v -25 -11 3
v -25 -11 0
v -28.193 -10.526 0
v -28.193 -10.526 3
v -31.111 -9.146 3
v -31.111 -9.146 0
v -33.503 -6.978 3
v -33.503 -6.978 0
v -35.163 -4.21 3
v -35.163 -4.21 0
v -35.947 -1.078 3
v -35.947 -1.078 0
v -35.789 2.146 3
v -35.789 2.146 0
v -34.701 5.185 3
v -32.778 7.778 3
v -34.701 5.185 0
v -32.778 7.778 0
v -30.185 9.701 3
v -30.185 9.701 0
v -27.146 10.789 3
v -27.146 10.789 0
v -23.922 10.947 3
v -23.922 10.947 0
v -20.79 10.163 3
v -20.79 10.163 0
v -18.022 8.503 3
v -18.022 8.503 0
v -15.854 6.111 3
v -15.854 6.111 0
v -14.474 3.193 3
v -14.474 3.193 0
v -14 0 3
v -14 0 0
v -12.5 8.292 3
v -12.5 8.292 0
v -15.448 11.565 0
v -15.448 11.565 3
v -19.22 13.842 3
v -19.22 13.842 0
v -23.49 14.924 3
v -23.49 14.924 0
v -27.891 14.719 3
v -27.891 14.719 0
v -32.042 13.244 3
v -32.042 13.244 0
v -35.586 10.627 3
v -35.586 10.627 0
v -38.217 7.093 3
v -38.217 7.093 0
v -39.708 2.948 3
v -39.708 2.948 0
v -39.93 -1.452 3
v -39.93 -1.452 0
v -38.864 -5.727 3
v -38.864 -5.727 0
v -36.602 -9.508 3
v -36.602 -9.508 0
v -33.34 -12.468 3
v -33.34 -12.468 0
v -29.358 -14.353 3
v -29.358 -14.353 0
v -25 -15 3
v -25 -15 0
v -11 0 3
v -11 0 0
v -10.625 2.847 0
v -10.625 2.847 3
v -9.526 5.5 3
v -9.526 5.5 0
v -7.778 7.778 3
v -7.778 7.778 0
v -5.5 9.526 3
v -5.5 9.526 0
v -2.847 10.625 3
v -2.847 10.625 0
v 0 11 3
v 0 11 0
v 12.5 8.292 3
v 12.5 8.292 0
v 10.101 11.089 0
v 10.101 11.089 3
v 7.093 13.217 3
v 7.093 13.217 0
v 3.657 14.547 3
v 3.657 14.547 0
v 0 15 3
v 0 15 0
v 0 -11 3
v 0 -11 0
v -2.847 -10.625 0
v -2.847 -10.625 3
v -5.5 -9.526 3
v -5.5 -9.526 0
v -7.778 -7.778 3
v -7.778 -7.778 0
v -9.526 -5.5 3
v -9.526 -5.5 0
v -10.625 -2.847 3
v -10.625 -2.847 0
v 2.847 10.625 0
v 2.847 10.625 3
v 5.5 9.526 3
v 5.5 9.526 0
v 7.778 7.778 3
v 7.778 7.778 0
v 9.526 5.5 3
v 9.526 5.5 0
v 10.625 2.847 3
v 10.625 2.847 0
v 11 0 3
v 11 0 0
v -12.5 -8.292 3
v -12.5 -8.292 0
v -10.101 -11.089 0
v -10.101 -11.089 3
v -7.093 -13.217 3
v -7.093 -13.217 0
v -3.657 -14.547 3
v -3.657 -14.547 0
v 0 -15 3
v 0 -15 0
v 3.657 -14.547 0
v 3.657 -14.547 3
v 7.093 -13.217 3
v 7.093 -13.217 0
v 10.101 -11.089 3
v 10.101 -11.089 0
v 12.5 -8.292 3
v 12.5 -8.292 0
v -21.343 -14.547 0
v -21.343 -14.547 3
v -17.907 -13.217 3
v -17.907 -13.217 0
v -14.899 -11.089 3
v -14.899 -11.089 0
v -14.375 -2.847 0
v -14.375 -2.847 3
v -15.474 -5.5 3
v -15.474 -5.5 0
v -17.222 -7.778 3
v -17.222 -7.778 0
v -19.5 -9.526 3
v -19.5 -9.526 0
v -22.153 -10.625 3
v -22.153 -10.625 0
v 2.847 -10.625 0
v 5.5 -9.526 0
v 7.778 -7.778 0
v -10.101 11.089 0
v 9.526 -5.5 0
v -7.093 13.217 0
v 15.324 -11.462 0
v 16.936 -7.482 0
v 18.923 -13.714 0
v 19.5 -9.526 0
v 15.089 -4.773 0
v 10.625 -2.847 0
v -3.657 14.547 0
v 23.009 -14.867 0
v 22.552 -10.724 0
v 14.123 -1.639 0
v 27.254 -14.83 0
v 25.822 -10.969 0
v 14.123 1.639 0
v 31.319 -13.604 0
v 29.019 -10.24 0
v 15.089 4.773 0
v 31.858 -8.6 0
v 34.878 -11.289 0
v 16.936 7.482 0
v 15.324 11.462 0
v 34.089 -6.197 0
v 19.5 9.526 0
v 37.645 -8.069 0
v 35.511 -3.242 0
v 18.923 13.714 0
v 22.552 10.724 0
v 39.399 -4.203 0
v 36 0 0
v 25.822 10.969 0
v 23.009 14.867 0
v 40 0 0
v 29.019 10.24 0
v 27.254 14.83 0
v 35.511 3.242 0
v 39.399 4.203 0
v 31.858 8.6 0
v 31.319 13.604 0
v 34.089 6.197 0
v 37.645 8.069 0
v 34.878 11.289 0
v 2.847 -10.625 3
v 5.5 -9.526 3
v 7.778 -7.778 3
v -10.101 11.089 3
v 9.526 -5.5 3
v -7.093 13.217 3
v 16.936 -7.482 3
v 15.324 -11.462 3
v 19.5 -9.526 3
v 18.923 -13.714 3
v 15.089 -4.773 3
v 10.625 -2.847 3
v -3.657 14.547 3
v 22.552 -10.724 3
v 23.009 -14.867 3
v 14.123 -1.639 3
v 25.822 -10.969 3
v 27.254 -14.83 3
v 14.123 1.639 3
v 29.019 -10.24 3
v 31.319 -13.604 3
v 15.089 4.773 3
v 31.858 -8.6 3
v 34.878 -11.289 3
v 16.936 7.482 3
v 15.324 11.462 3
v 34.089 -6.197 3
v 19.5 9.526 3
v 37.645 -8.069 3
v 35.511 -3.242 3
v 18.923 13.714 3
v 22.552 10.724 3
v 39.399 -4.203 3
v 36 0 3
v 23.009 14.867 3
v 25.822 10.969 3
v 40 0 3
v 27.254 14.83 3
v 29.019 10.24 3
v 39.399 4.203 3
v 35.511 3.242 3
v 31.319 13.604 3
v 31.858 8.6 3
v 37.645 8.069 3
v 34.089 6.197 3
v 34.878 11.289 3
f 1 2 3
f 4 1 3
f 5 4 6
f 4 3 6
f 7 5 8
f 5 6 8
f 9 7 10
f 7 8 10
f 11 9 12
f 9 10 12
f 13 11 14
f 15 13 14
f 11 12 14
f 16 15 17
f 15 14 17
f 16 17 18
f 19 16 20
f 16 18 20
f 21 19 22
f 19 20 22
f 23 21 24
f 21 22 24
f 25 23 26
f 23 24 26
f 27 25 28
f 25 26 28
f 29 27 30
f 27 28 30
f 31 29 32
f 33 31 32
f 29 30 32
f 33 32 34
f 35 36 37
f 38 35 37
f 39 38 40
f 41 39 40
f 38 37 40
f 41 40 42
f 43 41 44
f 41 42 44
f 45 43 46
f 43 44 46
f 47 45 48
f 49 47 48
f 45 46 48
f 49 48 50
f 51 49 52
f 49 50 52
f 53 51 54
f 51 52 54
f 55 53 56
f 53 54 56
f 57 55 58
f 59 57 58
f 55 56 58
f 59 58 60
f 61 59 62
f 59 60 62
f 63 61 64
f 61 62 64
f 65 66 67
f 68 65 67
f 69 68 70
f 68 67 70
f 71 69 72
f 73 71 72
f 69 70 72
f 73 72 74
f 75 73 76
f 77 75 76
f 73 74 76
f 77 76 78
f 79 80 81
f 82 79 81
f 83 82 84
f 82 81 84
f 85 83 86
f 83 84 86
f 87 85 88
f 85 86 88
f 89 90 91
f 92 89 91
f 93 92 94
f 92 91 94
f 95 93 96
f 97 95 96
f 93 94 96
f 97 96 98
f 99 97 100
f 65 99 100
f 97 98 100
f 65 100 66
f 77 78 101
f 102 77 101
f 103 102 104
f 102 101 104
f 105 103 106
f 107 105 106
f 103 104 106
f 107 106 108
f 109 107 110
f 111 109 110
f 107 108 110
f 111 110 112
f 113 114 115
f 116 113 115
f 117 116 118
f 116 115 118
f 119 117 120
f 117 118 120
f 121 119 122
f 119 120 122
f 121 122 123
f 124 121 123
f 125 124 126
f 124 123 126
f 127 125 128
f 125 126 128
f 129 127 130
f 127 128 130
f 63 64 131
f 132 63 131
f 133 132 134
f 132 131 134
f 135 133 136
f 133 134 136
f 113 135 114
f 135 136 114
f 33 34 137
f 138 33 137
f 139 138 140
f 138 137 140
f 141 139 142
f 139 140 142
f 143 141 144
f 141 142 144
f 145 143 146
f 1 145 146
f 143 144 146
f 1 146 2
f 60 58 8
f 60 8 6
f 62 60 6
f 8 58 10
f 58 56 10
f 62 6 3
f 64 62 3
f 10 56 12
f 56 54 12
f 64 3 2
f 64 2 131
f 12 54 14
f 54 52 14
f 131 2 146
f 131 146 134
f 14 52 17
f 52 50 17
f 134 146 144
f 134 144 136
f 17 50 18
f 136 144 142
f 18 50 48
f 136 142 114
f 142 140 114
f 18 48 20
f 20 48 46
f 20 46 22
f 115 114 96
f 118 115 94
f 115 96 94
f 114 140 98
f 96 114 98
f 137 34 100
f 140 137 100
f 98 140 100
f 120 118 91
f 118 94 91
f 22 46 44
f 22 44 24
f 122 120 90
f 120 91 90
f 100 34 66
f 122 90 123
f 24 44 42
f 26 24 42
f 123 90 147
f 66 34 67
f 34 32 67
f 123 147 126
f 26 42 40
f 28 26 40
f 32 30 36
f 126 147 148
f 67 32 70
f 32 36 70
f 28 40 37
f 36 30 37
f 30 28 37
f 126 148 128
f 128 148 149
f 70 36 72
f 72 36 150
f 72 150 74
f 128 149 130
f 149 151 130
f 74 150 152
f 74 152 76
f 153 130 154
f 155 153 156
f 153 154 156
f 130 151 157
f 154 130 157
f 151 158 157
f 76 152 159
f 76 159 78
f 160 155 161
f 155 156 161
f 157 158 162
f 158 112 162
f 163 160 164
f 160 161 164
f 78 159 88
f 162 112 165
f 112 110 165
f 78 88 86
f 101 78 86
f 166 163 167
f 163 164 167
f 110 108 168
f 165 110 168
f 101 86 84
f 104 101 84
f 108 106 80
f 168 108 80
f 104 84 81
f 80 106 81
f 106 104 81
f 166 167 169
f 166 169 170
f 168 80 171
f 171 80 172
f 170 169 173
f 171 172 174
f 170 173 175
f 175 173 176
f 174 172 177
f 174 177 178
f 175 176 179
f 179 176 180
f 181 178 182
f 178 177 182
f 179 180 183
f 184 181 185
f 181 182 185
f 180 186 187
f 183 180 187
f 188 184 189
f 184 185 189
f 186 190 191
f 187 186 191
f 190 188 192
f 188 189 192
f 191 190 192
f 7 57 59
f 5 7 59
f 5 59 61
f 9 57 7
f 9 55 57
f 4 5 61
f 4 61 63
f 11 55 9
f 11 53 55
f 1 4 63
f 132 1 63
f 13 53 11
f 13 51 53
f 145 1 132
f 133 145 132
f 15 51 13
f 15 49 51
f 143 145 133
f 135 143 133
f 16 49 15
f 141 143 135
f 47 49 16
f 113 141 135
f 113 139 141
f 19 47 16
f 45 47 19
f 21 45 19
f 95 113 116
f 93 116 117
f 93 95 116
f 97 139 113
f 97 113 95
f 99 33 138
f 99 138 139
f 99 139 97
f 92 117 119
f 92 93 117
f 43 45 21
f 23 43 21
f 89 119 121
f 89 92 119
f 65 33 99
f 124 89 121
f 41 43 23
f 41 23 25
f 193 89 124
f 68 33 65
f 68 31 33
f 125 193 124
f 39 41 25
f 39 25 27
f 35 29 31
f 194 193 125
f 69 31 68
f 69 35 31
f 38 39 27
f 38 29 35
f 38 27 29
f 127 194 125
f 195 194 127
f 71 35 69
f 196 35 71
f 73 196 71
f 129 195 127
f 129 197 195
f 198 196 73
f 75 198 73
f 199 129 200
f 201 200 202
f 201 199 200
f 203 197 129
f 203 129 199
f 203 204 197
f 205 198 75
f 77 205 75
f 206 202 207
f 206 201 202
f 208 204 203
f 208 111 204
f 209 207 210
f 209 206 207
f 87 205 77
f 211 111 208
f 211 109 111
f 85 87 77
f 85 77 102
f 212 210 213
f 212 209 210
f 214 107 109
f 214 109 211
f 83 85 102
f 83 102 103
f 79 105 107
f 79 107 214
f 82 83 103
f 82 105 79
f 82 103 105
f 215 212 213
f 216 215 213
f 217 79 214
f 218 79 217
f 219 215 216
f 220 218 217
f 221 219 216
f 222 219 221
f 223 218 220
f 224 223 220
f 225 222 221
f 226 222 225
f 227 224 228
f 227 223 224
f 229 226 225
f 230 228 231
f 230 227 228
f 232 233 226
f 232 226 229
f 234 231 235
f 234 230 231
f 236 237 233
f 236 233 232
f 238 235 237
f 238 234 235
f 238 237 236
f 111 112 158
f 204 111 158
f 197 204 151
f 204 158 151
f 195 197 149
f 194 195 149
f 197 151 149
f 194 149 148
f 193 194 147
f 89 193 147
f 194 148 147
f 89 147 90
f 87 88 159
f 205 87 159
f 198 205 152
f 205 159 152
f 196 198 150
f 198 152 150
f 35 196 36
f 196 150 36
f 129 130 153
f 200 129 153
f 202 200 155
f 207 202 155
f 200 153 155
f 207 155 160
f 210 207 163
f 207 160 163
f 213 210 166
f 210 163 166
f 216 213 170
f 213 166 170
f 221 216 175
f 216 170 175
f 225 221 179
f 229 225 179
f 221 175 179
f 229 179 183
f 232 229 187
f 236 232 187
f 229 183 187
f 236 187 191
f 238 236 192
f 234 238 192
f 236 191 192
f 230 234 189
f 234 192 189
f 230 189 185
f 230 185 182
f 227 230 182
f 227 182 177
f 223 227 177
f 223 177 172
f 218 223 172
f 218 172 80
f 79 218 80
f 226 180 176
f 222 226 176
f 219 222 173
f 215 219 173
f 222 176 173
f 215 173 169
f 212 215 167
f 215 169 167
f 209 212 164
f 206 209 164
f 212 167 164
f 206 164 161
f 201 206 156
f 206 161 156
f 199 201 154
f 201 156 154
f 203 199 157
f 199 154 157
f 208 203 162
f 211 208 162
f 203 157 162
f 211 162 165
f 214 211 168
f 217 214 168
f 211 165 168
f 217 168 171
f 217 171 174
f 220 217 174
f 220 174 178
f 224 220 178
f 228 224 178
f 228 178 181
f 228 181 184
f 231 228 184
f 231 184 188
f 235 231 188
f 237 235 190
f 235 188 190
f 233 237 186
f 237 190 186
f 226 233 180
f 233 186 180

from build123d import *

# Parameters (mm, degrees)
F1_DEPTH = 3


with BuildPart() as f1:
    # F0 (on Top) → F1 (new body)
    with BuildSketch(Plane.XY):
        with BuildLine():
            ThreePointArc((-25, -15), (-17.9068141727, -13.2169101843), (-12.5, -8.2915619759))
            ThreePointArc((-12.5, -8.2915619759), (-7.0931858273, -13.2169101843), (0, -15))
            ThreePointArc((0, -15), (7.0931858273, -13.2169101843), (12.5, -8.2915619759))
            ThreePointArc((12.5, -8.2915619759), (40, 0), (12.5, 8.2915619759))
            ThreePointArc((12.5, 8.2915619759), (7.0931858273, 13.2169101843), (0, 15))
            ThreePointArc((0, 15), (-7.0931858273, 13.2169101843), (-12.5, 8.2915619759))
            ThreePointArc((-12.5, 8.2915619759), (-38.2169101843, 7.0931858273), (-25, -15))
        make_face()
        with BuildLine():
            ThreePointArc((-14, 0), (-17.2218254069, -7.7781745931), (-25, -11))
            ThreePointArc((-25, -11), (-32.7781745931, 7.7781745931), (-14, 0))
        make_face(mode=Mode.SUBTRACT)
        with BuildLine():
            ThreePointArc((-11, 0), (-7.7781745931, 7.7781745931), (0, 11))
            ThreePointArc((0, 11), (7.7781745931, 7.7781745931), (11, 0))
            ThreePointArc((11, 0), (7.7781745931, -7.7781745931), (0, -11))
            ThreePointArc((0, -11), (-7.7781745931, -7.7781745931), (-11, 0))
        make_face(mode=Mode.SUBTRACT)
        with BuildLine():
            ThreePointArc((14, 0), (25, 11), (36, 0))
            ThreePointArc((36, 0), (25, -11), (14, 0))
        make_face(mode=Mode.SUBTRACT)
    extrude(amount=F1_DEPTH)


solid = f1.part
